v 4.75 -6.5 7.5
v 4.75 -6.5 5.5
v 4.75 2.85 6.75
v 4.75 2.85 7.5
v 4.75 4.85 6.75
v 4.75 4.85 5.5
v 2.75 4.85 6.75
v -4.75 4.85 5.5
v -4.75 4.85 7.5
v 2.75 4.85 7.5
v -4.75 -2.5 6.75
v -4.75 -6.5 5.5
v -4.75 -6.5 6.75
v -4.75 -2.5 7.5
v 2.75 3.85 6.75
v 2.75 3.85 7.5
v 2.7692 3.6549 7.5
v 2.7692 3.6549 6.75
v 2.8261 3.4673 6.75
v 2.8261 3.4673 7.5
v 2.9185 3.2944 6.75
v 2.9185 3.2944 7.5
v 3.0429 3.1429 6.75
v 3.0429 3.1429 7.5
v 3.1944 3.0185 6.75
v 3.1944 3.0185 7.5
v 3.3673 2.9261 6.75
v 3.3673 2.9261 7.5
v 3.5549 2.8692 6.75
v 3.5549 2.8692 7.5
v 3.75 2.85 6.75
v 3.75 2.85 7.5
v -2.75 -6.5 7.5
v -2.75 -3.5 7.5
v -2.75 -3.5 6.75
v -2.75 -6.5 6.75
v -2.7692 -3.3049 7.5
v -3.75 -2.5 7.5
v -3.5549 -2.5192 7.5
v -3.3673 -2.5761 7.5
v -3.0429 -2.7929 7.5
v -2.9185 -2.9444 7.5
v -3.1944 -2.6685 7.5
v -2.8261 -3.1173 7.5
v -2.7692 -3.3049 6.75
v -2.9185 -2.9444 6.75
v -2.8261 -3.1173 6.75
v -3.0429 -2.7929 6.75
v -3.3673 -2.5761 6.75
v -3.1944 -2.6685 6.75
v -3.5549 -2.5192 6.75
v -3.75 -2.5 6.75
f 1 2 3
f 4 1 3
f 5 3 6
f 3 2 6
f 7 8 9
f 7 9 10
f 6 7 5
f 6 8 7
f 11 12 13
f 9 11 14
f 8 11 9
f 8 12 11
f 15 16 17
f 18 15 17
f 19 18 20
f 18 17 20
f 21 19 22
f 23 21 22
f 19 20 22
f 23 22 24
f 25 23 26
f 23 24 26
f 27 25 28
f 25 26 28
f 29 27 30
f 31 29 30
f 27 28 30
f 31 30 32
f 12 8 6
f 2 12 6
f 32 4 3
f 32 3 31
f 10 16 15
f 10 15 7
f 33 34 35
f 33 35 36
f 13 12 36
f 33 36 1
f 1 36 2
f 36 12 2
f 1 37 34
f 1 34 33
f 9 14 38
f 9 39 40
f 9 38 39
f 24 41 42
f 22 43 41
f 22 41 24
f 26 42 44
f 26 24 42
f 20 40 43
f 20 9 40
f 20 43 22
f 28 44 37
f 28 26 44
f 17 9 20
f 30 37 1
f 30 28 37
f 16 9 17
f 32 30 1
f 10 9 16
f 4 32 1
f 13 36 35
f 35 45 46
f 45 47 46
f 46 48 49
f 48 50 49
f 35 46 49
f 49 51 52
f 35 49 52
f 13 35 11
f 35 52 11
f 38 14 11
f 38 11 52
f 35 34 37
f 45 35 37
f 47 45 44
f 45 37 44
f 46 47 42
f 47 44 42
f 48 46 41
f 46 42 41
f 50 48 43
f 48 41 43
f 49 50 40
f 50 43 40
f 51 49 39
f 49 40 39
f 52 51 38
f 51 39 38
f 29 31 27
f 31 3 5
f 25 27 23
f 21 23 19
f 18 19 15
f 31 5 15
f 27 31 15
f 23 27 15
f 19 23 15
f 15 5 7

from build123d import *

# Parameters (mm, degrees)
SKETCH001_W     = 9.5
SKETCH001_H     = 11.35
PAD002_DEPTH    = 2
POCKET_DEPTH    = 0.75
POCKET001_DEPTH = 0.75


with BuildPart() as part:
    # Sketch001 → Pad002 (new body)
    with BuildSketch(Plane.XY.offset(5.5)):
        with Locations((0, -0.825)):
            Rectangle(SKETCH001_W, SKETCH001_H)
    extrude(amount=PAD002_DEPTH)

    # Sketch003 → Pocket (cut)
    with BuildSketch(Plane.XY.offset(7.5)):
        with BuildLine():
            Line((2.75, 4.85), (4.75, 4.85))
            Line((4.75, 4.85), (4.75, 2.85))
            Line((4.75, 2.85), (3.75, 2.85))
            ThreePointArc((2.75, 3.85), (3.042893, 3.142893), (3.75, 2.85))
            Line((2.75, 3.85), (2.75, 4.85))
        make_face()
    extrude(amount=-POCKET_DEPTH, mode=Mode.SUBTRACT)

    # Sketch004 → Pocket001 (cut)
    with BuildSketch(Plane.XY.offset(7.5)):
        with BuildLine():
            Line((-4.75, -2.5), (-3.75, -2.5))
            ThreePointArc((-2.75, -3.5), (-3.042893, -2.792893), (-3.75, -2.5))
            Line((-2.75, -3.5), (-2.75, -6.5))
            Line((-2.75, -6.5), (-4.75, -6.5))
            Line((-4.75, -6.5), (-4.75, -2.5))
        make_face()
    extrude(amount=-POCKET001_DEPTH, mode=Mode.SUBTRACT)


solid = part.part
